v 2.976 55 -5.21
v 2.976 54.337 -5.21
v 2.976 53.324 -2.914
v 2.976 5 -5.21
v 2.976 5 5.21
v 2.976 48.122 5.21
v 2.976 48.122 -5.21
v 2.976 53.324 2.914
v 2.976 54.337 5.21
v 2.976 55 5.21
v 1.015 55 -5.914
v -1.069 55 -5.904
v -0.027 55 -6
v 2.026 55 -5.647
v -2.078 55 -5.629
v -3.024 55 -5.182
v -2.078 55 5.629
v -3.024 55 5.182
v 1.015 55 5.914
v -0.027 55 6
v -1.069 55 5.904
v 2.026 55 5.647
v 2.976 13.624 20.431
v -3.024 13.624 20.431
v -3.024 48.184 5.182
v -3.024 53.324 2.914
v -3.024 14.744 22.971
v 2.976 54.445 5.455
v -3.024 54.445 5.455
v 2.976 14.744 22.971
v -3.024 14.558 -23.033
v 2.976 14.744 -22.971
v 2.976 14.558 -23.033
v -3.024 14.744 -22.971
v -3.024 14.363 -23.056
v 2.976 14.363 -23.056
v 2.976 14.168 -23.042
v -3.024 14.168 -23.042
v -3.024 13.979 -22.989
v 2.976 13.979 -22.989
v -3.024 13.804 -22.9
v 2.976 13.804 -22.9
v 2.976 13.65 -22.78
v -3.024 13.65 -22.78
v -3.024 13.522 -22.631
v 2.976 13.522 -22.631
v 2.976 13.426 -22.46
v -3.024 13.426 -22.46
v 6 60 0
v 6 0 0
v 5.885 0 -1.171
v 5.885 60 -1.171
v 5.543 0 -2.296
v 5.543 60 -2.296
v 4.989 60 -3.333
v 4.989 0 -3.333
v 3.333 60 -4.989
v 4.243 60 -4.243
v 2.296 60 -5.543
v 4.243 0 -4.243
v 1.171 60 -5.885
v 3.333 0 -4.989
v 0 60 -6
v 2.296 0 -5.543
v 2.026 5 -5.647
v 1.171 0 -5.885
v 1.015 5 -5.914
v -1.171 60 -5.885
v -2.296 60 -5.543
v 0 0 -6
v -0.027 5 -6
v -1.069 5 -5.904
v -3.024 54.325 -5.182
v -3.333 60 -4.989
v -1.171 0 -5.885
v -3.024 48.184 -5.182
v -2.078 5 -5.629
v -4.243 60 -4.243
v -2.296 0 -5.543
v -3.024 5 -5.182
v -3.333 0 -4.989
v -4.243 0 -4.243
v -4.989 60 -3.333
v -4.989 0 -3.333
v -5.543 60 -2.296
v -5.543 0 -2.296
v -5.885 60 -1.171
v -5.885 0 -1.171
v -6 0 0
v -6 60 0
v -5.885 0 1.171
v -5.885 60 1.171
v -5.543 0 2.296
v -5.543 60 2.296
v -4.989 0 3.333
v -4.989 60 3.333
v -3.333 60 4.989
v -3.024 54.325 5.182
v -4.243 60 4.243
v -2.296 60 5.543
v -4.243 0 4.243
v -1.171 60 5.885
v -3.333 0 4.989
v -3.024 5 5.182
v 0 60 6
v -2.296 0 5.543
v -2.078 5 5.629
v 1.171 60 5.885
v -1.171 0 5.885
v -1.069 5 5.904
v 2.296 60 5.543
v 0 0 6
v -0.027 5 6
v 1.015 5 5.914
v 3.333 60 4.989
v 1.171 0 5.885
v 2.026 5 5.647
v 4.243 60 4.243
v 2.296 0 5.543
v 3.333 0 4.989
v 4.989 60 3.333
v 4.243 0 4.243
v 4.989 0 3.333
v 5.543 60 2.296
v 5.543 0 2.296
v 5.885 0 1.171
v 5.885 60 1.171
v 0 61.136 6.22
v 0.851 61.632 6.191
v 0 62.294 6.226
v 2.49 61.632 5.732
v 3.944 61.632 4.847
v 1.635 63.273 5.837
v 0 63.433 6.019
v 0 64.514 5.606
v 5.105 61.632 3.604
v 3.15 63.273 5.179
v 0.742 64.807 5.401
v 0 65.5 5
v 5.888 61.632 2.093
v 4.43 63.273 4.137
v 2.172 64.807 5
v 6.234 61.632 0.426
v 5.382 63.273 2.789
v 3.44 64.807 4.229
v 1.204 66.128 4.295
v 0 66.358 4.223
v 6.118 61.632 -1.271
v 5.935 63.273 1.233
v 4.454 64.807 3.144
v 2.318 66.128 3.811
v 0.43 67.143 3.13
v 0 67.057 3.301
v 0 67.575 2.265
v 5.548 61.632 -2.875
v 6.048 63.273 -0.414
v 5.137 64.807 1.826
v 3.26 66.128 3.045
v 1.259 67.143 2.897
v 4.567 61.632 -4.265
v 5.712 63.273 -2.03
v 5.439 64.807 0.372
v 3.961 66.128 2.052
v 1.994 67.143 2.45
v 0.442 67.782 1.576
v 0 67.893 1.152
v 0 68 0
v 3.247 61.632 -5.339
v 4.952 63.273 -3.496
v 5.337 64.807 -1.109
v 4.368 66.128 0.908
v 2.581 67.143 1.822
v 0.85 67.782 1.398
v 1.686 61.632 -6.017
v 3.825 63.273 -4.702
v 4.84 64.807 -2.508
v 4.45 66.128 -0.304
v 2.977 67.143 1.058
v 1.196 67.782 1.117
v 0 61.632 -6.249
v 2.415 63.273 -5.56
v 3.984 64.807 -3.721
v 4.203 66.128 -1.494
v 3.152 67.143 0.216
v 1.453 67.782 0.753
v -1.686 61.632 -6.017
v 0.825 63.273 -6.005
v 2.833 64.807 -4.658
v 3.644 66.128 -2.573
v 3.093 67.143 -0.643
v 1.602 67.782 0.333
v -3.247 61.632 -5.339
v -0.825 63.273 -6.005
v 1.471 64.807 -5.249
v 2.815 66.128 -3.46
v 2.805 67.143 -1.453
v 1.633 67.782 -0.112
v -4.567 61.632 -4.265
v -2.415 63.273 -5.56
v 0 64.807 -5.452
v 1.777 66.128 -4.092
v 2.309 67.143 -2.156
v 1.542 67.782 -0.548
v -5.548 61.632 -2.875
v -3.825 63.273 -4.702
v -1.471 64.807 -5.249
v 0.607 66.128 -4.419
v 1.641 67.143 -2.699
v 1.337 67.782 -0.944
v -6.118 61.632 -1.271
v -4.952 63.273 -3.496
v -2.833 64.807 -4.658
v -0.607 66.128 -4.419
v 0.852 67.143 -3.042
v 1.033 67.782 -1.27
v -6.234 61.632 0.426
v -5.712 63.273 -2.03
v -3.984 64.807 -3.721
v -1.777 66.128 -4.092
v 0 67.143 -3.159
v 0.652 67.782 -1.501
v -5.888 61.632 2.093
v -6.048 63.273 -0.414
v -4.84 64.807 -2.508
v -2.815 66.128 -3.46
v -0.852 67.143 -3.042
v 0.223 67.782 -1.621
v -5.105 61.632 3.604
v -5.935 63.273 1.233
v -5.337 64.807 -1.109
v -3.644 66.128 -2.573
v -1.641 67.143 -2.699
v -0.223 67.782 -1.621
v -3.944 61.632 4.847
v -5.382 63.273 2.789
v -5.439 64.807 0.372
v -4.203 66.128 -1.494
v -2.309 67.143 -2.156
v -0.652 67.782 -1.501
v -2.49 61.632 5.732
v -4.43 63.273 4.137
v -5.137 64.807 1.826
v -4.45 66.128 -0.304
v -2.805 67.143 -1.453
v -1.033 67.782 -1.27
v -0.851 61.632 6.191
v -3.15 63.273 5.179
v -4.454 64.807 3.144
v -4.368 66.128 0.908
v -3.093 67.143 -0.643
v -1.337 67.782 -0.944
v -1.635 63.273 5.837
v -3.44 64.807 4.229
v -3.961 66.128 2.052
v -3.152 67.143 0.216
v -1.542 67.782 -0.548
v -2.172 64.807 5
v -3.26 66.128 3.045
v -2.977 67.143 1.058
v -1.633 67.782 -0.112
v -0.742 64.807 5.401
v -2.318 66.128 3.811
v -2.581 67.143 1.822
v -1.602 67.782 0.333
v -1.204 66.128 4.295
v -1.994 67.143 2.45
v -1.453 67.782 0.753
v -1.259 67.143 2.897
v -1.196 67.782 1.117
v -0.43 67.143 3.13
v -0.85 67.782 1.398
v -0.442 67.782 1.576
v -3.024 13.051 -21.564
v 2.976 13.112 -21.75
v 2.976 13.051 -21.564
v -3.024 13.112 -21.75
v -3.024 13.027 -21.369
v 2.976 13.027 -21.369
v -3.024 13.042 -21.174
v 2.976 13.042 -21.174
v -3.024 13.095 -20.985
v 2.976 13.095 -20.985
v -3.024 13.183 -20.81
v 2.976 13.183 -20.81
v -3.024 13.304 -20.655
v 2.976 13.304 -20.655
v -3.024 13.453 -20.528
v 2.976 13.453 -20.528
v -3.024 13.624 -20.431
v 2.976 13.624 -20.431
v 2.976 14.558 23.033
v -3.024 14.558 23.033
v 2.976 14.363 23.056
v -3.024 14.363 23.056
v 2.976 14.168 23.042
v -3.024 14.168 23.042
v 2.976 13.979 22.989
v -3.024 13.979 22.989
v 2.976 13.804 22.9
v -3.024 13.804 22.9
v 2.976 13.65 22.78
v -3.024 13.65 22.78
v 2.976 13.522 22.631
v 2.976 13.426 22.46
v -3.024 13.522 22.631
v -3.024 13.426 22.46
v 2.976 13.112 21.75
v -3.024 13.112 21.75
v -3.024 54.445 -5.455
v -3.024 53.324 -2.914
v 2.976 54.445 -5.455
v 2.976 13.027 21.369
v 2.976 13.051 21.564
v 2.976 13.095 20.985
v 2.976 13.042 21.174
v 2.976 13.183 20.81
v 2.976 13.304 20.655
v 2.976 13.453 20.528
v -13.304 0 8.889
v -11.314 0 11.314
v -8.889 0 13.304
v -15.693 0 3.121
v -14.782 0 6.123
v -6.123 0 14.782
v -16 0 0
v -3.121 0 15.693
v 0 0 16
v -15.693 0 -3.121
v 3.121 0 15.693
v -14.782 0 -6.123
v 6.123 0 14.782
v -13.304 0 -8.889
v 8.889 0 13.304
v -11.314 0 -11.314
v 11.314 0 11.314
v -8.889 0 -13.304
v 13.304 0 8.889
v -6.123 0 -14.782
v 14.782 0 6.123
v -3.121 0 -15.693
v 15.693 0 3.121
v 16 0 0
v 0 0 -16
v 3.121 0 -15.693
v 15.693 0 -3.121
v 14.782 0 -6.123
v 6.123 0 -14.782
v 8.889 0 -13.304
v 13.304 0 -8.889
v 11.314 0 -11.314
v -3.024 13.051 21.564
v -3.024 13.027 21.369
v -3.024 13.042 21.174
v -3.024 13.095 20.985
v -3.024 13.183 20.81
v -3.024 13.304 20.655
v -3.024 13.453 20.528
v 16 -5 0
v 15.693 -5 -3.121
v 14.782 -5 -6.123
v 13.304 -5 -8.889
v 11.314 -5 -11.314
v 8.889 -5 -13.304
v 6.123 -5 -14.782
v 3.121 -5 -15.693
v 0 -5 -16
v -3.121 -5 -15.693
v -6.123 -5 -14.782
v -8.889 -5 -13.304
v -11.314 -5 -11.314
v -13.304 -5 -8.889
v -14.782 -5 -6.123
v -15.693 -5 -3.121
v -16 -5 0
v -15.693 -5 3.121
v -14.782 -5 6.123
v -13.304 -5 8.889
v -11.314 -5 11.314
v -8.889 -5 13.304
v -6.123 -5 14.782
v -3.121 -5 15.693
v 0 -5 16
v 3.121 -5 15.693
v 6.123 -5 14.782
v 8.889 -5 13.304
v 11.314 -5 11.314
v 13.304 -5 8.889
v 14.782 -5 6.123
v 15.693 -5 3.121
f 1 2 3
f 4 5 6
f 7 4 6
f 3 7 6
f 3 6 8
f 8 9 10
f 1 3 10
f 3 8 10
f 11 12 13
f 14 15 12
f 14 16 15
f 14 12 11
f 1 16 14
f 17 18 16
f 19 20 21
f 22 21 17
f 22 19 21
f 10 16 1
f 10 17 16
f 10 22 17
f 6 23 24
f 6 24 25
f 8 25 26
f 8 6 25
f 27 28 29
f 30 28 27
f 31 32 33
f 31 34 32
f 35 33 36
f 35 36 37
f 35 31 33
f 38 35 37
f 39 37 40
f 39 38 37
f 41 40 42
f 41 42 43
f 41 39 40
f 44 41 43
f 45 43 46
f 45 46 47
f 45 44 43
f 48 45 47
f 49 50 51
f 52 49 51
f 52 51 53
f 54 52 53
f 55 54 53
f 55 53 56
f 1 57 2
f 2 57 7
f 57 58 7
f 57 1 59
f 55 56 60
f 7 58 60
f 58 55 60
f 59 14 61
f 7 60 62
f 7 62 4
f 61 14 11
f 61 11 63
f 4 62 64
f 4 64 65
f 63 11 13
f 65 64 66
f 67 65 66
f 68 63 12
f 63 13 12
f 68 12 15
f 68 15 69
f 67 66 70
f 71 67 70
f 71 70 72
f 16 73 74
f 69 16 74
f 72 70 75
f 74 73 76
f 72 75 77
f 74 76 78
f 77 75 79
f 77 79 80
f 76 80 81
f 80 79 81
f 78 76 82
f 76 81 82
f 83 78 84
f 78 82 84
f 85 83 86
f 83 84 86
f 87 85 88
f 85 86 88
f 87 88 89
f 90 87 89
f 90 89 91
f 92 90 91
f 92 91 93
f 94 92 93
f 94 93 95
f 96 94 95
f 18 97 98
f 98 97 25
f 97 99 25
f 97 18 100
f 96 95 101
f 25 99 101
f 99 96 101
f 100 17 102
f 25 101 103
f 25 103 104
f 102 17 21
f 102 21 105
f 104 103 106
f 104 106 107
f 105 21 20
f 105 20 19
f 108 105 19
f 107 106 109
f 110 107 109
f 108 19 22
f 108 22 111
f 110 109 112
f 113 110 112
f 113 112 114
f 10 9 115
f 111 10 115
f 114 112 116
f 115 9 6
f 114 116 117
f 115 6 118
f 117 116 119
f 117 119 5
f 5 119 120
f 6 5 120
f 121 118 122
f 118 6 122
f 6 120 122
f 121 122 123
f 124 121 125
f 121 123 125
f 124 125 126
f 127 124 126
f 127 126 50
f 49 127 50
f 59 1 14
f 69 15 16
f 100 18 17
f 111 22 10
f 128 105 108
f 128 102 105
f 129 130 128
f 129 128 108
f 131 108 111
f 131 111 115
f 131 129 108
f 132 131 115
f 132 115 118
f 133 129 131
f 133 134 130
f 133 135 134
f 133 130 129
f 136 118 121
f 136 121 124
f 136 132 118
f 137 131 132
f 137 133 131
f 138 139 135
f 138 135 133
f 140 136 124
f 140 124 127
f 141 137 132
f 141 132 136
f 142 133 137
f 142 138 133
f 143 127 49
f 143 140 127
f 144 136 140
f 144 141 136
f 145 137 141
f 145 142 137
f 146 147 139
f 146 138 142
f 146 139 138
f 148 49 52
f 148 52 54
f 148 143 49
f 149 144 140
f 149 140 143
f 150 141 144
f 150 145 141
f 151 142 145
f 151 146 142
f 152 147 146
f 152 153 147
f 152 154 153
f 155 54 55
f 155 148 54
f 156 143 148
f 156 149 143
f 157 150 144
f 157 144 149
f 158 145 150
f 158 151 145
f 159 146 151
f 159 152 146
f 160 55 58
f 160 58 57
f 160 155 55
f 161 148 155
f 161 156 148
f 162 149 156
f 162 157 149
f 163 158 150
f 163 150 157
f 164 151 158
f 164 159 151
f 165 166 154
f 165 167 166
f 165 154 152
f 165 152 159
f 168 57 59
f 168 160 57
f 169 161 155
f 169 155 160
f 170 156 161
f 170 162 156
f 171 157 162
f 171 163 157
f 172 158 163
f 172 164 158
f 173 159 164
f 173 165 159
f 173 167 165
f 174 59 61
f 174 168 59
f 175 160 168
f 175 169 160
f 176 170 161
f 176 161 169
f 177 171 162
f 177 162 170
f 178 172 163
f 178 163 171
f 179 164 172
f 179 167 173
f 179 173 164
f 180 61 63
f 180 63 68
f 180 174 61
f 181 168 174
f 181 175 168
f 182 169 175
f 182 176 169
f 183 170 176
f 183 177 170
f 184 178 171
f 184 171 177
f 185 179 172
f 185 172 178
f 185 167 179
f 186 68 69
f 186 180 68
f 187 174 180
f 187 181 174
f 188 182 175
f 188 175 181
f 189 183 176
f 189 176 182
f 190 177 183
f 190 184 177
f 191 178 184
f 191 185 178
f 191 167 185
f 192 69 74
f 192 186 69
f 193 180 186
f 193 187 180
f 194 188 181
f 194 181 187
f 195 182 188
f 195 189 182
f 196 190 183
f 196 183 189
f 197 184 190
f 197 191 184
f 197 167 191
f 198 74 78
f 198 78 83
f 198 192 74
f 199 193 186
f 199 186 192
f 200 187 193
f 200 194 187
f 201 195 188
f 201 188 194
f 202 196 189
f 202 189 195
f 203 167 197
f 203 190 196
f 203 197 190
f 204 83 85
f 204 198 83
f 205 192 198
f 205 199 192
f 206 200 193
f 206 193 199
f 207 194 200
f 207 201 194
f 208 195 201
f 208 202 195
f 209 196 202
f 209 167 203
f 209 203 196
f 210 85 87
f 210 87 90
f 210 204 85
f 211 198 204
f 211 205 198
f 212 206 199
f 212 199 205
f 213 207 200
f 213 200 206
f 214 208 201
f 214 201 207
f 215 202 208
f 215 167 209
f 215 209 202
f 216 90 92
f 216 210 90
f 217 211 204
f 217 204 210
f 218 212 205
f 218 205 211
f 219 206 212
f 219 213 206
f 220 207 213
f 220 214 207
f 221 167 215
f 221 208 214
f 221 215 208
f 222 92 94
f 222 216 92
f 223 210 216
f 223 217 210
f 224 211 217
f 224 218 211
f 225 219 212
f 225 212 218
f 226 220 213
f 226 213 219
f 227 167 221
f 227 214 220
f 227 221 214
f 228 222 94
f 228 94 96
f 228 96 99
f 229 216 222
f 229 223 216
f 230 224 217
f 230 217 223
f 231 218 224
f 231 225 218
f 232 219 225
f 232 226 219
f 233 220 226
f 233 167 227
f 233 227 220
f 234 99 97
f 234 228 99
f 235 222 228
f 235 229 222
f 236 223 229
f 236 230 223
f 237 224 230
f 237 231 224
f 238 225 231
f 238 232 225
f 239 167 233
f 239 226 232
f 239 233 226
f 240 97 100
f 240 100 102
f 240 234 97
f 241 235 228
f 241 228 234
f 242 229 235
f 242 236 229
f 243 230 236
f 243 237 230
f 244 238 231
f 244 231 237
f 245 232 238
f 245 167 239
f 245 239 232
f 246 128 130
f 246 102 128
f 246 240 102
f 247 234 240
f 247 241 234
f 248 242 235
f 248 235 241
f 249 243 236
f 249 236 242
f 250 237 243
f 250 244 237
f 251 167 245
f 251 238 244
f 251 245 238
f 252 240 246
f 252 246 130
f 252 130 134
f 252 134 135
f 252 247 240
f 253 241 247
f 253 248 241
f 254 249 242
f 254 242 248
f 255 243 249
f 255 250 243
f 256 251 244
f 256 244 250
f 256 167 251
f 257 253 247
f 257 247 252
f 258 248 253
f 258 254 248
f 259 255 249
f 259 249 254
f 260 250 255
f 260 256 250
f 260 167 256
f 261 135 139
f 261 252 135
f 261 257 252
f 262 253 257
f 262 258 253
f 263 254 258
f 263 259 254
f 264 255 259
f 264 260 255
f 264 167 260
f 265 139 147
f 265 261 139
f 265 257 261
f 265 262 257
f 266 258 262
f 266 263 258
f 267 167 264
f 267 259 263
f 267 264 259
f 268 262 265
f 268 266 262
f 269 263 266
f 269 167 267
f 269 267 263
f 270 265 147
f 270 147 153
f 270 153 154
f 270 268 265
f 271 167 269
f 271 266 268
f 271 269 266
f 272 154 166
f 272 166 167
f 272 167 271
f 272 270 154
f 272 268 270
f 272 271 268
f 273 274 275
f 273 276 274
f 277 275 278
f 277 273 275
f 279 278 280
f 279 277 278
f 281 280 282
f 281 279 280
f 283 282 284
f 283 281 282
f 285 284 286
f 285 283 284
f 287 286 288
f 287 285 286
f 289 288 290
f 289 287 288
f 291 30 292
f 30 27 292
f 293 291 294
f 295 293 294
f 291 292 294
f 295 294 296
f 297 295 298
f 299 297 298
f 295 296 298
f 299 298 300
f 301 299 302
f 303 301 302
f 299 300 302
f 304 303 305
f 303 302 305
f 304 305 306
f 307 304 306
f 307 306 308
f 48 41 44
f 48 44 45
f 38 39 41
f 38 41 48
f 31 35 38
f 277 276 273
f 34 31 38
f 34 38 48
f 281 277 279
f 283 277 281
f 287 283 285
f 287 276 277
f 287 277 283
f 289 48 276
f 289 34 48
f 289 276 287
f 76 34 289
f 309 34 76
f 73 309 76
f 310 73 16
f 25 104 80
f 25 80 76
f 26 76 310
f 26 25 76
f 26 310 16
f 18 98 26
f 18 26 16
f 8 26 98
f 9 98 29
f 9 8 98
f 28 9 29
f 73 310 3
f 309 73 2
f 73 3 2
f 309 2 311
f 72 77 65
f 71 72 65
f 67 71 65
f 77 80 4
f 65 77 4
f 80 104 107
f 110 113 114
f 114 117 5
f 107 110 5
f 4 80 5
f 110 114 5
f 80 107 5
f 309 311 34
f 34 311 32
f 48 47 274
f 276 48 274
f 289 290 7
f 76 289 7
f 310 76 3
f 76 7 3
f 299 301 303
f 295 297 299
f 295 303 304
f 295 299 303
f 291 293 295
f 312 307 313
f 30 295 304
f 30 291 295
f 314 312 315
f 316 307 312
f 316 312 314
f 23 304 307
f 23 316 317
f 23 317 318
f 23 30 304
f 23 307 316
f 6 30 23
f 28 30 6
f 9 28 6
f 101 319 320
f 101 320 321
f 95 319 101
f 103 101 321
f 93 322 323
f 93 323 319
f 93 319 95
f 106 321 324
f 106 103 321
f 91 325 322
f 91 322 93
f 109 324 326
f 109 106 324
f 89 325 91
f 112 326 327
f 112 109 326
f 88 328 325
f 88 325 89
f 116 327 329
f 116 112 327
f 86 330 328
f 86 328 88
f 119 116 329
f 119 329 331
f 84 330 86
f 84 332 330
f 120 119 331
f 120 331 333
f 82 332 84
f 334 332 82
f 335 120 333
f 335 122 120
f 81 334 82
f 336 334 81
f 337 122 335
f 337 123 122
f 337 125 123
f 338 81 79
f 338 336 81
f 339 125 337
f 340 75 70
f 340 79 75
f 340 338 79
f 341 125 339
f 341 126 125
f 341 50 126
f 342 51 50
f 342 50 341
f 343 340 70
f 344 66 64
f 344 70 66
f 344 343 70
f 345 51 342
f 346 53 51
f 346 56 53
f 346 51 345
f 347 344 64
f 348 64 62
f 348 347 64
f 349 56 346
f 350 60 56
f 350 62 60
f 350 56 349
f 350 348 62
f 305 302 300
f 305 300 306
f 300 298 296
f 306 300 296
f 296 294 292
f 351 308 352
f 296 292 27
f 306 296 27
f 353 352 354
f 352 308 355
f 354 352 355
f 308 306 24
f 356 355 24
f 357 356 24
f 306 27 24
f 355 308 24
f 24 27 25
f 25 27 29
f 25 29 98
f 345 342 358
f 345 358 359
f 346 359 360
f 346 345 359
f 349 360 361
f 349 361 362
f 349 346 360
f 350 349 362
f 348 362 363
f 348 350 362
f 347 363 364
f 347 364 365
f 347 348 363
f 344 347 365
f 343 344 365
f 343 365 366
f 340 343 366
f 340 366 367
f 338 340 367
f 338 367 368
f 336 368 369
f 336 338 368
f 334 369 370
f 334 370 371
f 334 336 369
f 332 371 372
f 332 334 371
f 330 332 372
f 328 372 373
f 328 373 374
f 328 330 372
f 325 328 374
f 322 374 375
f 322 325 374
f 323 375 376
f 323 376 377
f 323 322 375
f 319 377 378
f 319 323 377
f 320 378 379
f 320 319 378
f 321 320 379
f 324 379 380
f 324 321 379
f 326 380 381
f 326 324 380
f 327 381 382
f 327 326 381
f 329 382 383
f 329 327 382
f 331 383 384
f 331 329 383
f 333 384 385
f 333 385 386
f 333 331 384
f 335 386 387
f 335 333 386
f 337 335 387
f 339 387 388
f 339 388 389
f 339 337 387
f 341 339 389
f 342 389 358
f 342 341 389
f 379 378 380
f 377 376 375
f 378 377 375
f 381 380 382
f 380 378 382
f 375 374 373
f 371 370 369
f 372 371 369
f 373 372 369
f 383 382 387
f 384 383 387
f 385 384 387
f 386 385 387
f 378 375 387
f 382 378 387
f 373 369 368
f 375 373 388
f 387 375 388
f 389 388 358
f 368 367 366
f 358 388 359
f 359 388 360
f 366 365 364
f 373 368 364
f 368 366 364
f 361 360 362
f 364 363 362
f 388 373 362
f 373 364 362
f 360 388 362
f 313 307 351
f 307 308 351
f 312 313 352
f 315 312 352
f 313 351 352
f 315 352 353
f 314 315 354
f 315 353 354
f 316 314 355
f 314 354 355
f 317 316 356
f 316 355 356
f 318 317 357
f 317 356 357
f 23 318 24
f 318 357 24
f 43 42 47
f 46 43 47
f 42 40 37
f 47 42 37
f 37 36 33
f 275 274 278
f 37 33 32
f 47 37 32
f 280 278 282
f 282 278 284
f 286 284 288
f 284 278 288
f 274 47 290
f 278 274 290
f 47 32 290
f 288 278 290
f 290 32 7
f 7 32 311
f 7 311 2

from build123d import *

# Parameters (mm, degrees)
SKETCH1_R               = 16
BOSS_EXTRUDE1_DEPTH     = 5
SKETCH2_R               = 6
BOSS_EXTRUDE2_DEPTH     = 60
DOME1_FACE_RADIUS       = 6
DOME1_HEIGHT            = 8
SKETCH3_W               = 6
SKETCH3_H               = 50
CUT_EXTRUDE1_DEPTH      = 6
CUT_EXTRUDE1_DEPTH_BACK = 6
BOSS_EXTRUDE6_DEPTH     = 6
FILLET2_R               = 1
FILLET4_R               = 1
FILLET2_OF_MIRROR2_R    = 1
FILLET4_OF_MIRROR2_R    = 1


with BuildPart() as part:
    # Sketch1 → Boss-Extrude1 (new body)
    with BuildSketch(Plane(origin=(0, 0, 0), x_dir=(1, 0, 0), z_dir=(0, 1, 0))):
        Circle(SKETCH1_R)
    extrude(amount=-BOSS_EXTRUDE1_DEPTH)

    # Sketch2 → Boss-Extrude2 (add)
    with BuildSketch(Plane(origin=(0, 0, 0), x_dir=(1, 0, 0), z_dir=(0, 1, 0))):
        Circle(SKETCH2_R)
    extrude(amount=BOSS_EXTRUDE2_DEPTH)

    # Dome1: a dome of height H over a round flat face of radius A is a cap of a sphere of radius (A * A + H * H) / (2 * H)
    dome1_r = (DOME1_FACE_RADIUS * DOME1_FACE_RADIUS + DOME1_HEIGHT * DOME1_HEIGHT) / (2 * DOME1_HEIGHT)
    dome1_base = Plane((0, 60, 0), z_dir=(0, 1, 0))
    with Locations(dome1_base.offset(DOME1_HEIGHT - dome1_r)):
        dome1_ball = Sphere(dome1_r, mode=Mode.PRIVATE)
    add(split(dome1_ball, bisect_by=dome1_base, keep=Keep.TOP, mode=Mode.PRIVATE))

    # Sketch3 → Cut-Extrude1 (cut, two sides)
    with BuildSketch(Plane.XY) as cut_extrude1_sk:
        with Locations((-0.023759129, 30)):
            Rectangle(SKETCH3_W, SKETCH3_H)
    extrude(amount=CUT_EXTRUDE1_DEPTH, mode=Mode.SUBTRACT)
    extrude(cut_extrude1_sk.sketch, amount=-CUT_EXTRUDE1_DEPTH_BACK, mode=Mode.SUBTRACT)

    # Sketch4 → Boss-Extrude6 (add)
    with BuildSketch(Plane.ZY.offset(-2.976240871)):
        Polygon((5.454631491, 54.445098747), (23.375133838, 13.829372646), (20.834979102, 12.708603592), (2.914476754, 53.324329693), align=None)
    boss_extrude6 = extrude(amount=BOSS_EXTRUDE6_DEPTH)

    # Fillet2
    fillet2_edges = [part.edges().sort_by_distance(p)[0] for p in [
        (-0.023759129, 13.829372646, 23.375133838),
    ]]
    fillet(fillet2_edges, radius=FILLET2_R)

    # Fillet4
    fillet4_edges = [part.edges().sort_by_distance(p)[0] for p in [
        (-0.023759129, 12.708603592, 20.834979102),
    ]]
    fillet(fillet4_edges, radius=FILLET4_R)

    # Mirror2: Boss-Extrude6 across plane
    add(boss_extrude6.mirror(Plane.XY))

    # Fillet2 of Mirror2
    fillet2_of_mirror2_edges = [part.edges().sort_by_distance(p)[0] for p in [
        (-0.023759129, 13.829372646, -23.375133838),
    ]]
    fillet(fillet2_of_mirror2_edges, radius=FILLET2_OF_MIRROR2_R)

    # Fillet4 of Mirror2
    fillet4_of_mirror2_edges = [part.edges().sort_by_distance(p)[0] for p in [
        (-0.023759129, 12.708603592, -20.834979102),
    ]]
    fillet(fillet4_of_mirror2_edges, radius=FILLET4_OF_MIRROR2_R)


solid = part.part
